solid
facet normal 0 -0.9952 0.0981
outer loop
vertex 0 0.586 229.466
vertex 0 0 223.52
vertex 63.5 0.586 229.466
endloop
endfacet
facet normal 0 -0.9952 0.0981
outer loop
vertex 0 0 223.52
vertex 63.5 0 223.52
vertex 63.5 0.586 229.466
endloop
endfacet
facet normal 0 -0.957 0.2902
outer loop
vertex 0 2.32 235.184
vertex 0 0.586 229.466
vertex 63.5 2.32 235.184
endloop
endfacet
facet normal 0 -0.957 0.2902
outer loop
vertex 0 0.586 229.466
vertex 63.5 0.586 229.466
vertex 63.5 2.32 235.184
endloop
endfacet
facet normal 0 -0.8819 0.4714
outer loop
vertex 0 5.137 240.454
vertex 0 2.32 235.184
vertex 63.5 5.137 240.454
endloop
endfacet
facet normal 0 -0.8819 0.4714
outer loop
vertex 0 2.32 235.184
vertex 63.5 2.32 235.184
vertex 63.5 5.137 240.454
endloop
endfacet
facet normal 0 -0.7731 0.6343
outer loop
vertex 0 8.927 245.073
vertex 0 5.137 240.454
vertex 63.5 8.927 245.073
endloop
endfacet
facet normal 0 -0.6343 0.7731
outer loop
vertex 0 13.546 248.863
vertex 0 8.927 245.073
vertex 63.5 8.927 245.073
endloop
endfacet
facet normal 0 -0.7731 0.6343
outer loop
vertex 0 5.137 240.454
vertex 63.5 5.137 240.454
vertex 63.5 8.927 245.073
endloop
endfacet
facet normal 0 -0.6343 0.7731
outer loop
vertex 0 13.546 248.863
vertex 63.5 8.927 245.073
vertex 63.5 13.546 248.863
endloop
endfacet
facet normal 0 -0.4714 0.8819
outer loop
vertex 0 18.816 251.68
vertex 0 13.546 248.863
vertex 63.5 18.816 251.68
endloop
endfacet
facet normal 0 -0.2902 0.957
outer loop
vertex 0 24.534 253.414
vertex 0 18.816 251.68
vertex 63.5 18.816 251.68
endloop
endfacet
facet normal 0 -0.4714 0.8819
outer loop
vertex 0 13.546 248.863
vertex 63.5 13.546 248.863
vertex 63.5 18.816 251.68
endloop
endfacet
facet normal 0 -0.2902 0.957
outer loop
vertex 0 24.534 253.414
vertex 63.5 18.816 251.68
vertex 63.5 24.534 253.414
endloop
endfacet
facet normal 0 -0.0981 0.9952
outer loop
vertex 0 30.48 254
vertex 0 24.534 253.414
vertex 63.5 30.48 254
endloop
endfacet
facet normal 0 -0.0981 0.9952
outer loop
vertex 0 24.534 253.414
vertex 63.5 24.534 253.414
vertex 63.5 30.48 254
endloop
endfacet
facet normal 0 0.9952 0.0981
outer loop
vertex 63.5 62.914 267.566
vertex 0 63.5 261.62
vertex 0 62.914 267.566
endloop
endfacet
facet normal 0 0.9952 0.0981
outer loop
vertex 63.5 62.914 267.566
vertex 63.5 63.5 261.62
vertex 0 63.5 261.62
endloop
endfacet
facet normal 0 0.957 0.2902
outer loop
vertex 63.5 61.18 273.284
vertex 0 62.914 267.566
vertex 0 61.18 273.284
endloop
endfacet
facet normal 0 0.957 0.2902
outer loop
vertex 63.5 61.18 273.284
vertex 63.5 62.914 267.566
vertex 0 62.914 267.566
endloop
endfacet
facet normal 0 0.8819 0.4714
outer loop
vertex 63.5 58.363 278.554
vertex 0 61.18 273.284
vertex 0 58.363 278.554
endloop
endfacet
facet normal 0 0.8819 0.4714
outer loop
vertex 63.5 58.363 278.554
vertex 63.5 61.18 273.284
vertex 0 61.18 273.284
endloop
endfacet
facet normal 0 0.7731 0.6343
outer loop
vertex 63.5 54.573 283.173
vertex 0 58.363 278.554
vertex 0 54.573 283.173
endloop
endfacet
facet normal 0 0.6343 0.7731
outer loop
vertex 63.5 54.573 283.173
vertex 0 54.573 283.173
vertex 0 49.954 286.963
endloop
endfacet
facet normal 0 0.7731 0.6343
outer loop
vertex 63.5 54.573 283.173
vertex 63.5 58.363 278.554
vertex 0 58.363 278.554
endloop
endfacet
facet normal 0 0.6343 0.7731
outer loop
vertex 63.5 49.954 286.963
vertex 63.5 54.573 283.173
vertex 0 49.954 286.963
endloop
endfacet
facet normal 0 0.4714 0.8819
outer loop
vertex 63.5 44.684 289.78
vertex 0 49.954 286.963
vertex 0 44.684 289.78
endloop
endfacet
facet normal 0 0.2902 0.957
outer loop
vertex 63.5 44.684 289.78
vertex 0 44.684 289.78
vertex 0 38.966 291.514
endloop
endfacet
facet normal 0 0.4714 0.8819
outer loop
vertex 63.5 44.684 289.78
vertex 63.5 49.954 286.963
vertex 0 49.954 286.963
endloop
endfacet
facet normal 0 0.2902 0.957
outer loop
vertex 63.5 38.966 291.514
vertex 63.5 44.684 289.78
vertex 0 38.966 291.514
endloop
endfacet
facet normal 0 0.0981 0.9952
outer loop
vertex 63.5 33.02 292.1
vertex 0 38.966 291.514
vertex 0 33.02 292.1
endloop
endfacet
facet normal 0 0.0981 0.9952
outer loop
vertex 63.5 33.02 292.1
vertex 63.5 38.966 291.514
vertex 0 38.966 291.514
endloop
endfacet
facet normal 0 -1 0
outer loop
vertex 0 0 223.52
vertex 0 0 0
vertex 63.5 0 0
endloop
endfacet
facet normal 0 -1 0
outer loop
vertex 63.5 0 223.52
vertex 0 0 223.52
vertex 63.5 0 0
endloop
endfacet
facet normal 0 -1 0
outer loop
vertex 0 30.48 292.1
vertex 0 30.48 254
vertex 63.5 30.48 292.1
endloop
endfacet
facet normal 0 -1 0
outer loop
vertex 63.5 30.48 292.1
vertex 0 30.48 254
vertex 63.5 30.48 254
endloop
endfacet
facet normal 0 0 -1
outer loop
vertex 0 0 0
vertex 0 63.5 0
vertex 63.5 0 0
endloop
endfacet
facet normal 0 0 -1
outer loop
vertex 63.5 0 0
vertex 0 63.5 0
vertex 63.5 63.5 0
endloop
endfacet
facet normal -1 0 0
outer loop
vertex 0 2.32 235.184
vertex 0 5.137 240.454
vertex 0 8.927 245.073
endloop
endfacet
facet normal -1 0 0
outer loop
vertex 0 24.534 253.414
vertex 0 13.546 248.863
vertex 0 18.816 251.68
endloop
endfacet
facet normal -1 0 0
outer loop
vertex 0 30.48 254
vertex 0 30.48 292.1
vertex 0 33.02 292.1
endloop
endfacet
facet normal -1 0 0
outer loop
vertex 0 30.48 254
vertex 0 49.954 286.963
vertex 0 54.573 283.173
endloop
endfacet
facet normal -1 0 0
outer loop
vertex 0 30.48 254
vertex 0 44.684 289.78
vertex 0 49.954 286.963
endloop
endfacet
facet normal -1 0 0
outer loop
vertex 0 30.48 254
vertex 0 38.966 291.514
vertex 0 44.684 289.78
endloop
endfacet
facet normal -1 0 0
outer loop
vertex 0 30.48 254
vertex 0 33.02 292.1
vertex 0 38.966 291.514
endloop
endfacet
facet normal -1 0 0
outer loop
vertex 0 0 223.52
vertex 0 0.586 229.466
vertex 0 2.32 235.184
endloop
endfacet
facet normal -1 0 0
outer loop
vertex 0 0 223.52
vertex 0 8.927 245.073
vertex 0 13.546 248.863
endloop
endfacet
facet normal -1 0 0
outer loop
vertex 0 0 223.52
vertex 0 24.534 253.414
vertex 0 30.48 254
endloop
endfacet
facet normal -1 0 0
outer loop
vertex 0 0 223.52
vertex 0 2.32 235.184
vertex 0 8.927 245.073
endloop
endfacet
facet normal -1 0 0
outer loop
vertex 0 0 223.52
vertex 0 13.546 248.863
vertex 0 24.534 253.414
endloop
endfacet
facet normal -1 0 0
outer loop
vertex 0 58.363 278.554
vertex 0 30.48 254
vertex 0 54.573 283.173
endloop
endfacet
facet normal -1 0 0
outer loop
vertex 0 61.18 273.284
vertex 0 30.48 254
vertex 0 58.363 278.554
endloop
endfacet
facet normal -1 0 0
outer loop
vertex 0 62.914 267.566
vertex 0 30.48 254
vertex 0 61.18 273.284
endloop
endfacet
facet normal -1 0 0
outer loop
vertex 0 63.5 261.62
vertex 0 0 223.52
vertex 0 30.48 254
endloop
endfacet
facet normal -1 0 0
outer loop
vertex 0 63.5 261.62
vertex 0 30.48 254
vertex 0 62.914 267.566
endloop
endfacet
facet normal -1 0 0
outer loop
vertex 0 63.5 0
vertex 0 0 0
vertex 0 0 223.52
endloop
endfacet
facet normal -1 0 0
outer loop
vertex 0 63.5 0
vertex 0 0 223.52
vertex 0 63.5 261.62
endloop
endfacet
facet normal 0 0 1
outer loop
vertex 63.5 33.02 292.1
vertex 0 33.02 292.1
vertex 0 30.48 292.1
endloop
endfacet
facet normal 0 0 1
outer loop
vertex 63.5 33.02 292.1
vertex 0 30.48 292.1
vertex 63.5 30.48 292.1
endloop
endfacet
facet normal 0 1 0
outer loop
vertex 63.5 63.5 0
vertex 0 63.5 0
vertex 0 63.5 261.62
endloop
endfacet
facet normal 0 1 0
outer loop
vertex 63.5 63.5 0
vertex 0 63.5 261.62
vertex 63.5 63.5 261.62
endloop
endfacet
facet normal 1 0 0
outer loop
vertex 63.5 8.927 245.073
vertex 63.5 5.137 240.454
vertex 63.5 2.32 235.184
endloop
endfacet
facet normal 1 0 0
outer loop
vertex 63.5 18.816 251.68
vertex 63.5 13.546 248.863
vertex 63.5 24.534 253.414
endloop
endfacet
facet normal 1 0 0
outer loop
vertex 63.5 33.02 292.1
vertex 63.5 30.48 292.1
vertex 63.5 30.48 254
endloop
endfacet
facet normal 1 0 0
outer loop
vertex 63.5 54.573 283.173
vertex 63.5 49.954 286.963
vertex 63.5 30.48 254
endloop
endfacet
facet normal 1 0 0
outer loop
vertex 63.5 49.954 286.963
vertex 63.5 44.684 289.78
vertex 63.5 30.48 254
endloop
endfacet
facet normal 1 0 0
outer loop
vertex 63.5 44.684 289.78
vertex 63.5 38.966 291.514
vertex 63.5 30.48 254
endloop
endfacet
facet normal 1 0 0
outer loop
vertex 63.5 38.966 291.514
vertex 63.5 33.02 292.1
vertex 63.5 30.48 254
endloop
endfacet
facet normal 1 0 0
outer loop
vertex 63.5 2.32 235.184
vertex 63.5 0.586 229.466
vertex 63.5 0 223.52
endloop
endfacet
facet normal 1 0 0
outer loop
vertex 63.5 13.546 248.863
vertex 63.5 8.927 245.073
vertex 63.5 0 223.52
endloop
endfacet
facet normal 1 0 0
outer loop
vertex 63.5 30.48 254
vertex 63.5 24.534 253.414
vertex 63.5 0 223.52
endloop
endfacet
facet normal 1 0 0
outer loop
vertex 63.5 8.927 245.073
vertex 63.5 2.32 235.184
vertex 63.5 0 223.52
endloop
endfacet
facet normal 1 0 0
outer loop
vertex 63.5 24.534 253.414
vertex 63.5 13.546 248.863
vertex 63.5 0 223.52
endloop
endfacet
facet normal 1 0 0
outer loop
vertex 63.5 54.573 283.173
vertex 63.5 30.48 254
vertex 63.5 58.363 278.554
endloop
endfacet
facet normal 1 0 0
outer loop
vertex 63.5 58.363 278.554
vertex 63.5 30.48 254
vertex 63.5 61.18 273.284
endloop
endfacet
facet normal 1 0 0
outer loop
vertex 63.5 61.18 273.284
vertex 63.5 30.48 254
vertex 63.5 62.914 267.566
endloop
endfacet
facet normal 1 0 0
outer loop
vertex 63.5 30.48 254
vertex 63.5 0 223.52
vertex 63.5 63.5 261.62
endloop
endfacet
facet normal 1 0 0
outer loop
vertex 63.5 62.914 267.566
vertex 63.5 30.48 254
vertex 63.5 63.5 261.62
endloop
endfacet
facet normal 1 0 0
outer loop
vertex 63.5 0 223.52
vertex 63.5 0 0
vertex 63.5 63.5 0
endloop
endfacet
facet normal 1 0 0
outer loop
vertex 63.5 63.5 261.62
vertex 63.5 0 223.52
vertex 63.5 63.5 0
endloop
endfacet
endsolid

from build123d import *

# Parameters (mm, degrees)
F0_W     = 63.5
F0_H     = 63.5
F1_DEPTH = 254
F2_R     = 30.48
F3_W     = 63.5
F3_H     = 33.02
F4_DEPTH = 38.1
F5_R     = 30.48


with BuildPart() as f1:
    # F0 (on Top) → F1 (new body)
    with BuildSketch(Plane.XY):
        with Locations((31.75, 31.75)):
            Rectangle(F0_W, F0_H)
    extrude(amount=F1_DEPTH)

    # F2
    f2_edges = [f1.edges().sort_by_distance(p)[0] for p in [
        (31.75, 0, 254),
    ]]
    fillet(f2_edges, radius=F2_R)

    # F3 (on face) → F4 (join)
    with BuildSketch(Plane.XY.offset(254)):
        with Locations((31.75, 46.99)):
            Rectangle(F3_W, F3_H)
    extrude(amount=F4_DEPTH)

    # F5
    f5_edges = [f1.edges().sort_by_distance(p)[0] for p in [
        (31.75, 63.5, 292.1),
    ]]
    fillet(f5_edges, radius=F5_R)


solid = f1.part
